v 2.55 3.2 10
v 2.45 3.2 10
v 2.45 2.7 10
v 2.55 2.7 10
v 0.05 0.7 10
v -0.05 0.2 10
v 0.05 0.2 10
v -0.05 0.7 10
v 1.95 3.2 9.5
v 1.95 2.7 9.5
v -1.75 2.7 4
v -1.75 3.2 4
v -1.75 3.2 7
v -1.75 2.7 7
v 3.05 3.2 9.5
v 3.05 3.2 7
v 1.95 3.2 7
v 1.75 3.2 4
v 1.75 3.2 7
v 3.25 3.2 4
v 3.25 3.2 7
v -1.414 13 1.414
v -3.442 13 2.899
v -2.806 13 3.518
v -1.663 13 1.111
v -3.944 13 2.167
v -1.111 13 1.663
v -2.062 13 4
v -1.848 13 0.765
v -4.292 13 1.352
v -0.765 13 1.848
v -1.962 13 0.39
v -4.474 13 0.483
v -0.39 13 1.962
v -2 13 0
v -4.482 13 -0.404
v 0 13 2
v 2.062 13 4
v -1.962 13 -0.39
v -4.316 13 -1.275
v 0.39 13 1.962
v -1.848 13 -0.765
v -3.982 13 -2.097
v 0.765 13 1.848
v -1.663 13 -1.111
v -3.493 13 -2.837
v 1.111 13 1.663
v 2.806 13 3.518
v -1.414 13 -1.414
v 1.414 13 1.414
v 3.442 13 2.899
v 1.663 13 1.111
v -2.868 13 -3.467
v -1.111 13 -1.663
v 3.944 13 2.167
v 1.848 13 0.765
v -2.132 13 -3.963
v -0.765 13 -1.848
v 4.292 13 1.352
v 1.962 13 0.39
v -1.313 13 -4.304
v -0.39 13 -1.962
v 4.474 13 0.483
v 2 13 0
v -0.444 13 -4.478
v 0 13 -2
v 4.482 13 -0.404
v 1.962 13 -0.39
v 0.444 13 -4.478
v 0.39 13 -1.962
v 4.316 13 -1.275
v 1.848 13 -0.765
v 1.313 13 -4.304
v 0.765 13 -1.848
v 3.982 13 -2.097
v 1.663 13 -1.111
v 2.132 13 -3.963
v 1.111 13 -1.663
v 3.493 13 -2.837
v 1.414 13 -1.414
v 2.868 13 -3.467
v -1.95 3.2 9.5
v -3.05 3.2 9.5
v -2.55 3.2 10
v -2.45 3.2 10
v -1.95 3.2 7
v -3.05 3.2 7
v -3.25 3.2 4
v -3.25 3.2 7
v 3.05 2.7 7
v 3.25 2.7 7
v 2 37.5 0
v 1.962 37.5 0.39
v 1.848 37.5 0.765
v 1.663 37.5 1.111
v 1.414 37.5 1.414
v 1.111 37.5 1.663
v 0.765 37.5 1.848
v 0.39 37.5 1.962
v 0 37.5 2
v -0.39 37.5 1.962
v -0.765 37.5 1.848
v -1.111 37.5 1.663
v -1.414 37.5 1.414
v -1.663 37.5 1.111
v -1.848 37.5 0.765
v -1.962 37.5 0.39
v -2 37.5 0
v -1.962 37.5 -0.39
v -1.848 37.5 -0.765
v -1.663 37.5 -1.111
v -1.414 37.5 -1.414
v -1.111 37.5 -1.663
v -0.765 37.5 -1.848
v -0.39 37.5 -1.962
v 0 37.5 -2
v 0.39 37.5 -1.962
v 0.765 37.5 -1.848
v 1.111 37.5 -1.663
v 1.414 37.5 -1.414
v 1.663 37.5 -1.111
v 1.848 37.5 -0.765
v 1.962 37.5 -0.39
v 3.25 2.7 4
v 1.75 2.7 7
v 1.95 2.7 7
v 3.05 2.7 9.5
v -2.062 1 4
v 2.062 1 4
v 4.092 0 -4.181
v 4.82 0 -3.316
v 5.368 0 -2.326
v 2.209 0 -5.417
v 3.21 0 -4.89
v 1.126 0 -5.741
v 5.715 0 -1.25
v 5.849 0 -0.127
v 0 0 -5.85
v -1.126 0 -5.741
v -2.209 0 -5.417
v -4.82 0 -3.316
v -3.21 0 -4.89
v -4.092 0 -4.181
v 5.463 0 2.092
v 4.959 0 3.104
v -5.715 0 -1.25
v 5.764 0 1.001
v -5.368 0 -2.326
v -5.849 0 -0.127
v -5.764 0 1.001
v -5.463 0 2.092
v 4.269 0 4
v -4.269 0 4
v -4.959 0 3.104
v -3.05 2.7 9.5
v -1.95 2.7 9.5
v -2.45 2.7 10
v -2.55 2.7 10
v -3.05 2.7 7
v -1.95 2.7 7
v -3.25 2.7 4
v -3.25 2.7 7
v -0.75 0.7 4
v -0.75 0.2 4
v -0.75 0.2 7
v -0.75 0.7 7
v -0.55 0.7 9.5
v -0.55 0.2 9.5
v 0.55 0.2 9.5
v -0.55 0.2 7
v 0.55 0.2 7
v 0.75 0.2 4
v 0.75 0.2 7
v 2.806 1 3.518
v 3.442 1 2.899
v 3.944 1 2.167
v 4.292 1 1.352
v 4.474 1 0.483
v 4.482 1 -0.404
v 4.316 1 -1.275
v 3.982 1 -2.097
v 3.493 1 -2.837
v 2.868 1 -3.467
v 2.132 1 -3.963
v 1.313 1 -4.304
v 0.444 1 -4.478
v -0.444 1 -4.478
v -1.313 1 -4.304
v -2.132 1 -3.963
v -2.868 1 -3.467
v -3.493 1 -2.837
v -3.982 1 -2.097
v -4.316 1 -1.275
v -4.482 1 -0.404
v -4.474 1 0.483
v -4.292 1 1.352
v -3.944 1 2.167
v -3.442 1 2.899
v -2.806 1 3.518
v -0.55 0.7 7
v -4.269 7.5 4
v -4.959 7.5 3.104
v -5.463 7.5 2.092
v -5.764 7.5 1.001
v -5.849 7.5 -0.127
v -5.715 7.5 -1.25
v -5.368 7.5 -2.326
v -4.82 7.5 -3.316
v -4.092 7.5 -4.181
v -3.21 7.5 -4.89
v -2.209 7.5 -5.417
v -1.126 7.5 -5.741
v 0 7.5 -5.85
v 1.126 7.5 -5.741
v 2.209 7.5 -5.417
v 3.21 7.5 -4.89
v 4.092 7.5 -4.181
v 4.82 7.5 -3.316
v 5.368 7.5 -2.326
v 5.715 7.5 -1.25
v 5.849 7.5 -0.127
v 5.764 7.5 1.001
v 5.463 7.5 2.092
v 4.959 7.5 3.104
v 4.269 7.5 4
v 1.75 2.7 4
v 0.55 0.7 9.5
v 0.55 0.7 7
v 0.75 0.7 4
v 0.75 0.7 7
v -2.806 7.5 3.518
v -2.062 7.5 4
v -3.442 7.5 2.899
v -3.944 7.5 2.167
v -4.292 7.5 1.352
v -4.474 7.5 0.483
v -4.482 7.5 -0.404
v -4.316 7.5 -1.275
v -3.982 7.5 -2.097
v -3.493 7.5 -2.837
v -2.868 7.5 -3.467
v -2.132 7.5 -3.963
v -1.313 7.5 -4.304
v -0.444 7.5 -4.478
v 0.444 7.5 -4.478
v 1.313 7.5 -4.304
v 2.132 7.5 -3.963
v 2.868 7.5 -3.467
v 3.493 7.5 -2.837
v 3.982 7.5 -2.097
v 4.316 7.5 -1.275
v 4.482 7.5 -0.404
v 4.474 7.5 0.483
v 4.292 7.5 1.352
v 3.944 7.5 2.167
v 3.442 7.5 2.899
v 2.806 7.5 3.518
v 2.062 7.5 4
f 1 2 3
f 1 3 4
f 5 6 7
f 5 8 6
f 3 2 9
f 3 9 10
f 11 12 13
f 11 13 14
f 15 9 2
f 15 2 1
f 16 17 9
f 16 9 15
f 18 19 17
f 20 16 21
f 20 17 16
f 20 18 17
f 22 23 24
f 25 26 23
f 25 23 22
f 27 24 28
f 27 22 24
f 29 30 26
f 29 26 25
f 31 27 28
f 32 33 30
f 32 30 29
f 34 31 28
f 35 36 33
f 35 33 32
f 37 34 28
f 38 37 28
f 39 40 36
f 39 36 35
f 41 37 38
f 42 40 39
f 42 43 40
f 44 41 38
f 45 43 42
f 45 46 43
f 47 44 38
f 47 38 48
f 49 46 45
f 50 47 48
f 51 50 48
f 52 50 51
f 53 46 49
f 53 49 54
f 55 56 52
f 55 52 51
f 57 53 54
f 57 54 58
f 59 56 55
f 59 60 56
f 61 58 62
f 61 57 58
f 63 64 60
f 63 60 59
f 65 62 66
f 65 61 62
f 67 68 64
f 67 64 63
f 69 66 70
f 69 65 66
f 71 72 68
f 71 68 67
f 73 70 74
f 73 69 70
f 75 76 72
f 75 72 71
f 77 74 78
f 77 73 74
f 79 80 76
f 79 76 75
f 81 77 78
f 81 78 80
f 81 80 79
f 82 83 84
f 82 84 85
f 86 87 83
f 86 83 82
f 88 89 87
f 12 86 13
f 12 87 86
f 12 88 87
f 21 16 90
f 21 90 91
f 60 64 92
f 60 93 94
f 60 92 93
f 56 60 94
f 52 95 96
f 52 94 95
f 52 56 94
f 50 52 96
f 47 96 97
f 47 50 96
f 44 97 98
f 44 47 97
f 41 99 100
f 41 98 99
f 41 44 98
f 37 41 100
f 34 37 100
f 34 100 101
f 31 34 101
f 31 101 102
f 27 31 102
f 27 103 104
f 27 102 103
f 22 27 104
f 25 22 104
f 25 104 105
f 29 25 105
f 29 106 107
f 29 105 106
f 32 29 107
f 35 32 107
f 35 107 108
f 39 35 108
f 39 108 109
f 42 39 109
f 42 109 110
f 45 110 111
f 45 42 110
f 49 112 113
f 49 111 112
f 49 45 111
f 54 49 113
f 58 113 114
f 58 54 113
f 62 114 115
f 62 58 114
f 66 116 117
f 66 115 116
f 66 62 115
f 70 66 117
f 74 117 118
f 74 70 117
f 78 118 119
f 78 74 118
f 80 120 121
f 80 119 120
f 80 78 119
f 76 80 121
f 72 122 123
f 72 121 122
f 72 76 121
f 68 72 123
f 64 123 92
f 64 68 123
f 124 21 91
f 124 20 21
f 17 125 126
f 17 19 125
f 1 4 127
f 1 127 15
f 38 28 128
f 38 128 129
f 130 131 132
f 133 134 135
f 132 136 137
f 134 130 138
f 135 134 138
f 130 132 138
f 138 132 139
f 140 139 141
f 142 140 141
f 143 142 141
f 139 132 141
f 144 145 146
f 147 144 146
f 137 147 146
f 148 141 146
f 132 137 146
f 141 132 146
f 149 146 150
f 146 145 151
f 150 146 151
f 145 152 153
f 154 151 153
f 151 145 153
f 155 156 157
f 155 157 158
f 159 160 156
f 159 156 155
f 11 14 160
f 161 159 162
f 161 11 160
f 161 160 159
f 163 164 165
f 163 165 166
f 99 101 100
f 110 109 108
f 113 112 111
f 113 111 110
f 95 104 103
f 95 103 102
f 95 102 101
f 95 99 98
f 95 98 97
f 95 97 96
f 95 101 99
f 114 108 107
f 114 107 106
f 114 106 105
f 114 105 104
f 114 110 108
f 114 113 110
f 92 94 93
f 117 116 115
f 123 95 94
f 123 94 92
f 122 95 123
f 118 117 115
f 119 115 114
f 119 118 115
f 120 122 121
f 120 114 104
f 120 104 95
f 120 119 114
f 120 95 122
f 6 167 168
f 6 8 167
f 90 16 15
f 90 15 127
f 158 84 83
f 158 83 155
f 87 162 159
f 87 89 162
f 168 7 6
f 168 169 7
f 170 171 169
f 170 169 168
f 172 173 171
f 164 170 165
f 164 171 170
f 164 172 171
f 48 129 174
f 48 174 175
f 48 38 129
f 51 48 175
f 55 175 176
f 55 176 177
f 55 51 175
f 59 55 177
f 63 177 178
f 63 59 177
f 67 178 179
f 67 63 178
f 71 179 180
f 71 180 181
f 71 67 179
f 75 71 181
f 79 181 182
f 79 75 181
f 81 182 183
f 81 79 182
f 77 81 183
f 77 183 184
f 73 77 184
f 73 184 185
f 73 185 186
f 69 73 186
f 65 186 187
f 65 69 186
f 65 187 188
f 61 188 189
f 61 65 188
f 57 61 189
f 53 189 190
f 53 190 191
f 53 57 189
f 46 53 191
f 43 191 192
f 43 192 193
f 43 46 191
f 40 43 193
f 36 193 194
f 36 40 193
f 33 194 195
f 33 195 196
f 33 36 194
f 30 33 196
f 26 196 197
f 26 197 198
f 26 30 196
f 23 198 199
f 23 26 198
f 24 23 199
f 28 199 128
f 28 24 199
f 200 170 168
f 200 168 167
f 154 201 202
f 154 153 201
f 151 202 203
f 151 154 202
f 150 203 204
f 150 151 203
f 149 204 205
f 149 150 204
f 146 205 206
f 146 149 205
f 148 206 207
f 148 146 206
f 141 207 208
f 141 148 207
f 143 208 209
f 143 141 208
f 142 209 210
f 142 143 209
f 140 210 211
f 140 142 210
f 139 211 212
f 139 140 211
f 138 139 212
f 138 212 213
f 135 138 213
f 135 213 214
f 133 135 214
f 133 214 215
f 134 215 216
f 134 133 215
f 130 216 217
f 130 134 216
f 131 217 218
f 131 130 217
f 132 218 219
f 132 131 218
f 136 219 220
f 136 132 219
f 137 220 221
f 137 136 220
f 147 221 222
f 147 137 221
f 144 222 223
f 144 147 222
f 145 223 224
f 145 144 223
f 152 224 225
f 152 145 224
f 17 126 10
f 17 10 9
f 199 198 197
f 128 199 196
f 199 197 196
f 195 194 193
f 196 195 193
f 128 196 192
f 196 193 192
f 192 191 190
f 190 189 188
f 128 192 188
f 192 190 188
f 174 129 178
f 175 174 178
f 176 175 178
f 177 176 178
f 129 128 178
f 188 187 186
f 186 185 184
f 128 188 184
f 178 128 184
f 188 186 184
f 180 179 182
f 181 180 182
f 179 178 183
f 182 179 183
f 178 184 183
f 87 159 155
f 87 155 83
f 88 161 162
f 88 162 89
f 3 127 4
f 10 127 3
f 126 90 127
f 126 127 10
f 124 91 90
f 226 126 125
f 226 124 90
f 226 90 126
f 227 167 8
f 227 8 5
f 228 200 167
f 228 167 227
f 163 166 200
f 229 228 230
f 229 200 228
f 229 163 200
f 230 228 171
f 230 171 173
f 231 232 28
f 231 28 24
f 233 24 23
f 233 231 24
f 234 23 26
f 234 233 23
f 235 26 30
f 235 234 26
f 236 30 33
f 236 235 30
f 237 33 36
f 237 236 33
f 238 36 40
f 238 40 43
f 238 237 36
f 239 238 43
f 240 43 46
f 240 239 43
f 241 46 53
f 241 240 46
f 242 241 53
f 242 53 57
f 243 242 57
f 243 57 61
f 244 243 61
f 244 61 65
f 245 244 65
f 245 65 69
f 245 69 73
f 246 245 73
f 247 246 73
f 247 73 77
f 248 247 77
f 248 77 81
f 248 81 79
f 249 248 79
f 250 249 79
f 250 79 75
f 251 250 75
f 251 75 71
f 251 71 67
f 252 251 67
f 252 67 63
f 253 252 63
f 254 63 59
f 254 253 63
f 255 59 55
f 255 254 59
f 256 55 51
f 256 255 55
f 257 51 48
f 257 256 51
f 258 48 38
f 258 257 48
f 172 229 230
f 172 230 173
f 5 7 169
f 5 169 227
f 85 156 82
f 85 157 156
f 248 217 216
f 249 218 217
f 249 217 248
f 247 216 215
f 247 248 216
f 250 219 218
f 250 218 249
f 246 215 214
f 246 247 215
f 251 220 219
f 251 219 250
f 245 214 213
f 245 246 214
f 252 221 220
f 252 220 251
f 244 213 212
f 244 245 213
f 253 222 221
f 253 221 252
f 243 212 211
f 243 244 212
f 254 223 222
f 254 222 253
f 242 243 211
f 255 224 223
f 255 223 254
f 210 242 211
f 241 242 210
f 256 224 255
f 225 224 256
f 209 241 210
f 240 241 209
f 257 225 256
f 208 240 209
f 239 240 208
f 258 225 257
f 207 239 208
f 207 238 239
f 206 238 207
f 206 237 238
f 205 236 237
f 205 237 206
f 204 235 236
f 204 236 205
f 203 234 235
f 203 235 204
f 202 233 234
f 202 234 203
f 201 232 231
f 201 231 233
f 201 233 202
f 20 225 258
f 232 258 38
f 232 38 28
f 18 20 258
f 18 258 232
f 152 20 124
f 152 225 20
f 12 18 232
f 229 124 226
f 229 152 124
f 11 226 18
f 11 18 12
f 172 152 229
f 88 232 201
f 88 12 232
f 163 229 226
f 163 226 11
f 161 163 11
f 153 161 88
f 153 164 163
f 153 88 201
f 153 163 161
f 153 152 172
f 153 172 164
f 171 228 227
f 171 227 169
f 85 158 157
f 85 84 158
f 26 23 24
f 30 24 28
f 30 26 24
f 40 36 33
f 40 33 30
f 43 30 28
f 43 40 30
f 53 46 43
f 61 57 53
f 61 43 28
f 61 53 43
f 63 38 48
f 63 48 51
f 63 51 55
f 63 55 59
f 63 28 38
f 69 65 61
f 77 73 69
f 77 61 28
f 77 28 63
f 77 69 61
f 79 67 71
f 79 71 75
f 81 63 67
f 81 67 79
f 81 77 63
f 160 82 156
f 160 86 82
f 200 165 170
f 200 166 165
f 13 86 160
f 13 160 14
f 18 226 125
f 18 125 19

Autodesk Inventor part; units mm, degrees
ref_plane "YZ Plane" through (0, 0, 0) normal (1, 0, 0) x (0, 1, 0)
ref_plane "XZ Plane" through (0, 0, 0) normal (0, 1, 0) x (-1, 0, 0)
ref_plane "XY Plane" through (0, 0, 0) normal (0, 0, 1) x (1, 0, 0)
sketch "Sketch1" plane through (0, 0, 0) normal (0, 1, 0) x (-1, 0, 0)
  circle A0 centre (0, 0) radius 5.85
  line L0 (5, 0) -> (-5, 0)
  line L1 (-5, 0) -> (-5, 4)
  line L2 (-5, 4) -> (5, 4)
  line L3 (5, 4) -> (5, 0)
  point P0 (4.2688, 4)
  point P1 (-4.2688, 4)
  dimension "d0" = 11.7
  dimension "d1" = 4
  dimension "d2" = 10
extrude "Extrusion1" add sketch "Sketch1" along normal blind 7.5 contours A0 L1 L0 L3 | L3 L0 L1 A0 L2
sketch "Sketch2" plane through (0, 7.5, 0) normal (0, 1, 0) x (1, 0, 0)
  arc A0 (4.2688, -4) -> (-4.2688, -4) centre (0, 0) ccw projected
  circle A1 centre (0, 0) radius 4.5
  line L0 (-4.2688, -4) -> (4.2688, -4) projected
  arc A2 (4.2688, -4) -> (-4.2688, -4) centre (0, 0) ccw projected
  point P0 (-2.0616, -4)
  point P1 (2.0616, -4)
  dimension "d5" = 9
extrude "Extrusion2" add sketch "Sketch2" along normal blind 5.5 contours L0 A1 picked at (-0.2884, 2.0732)
sketch "Sketch3" plane through (0, 13, 0) normal (0, 1, 0) x (1, 0, 0)
  circle A0 centre (0, 0) radius 2
  dimension "d8" = 4
extrude "Extrusion3" add sketch "Sketch3" along normal blind 24.5
sketch "Sketch4" plane through (-4.2688, 0, 4) normal (0, 0, 1) x (1, 0, 0)
  line L0 (3.5188, 0.7) -> (5.0188, 0.7)
  line L1 (5.0188, 0.7) -> (5.0188, 0.2)
  line L2 (5.0188, 0.2) -> (3.5188, 0.2)
  line L3 (3.5188, 0.2) -> (3.5188, 0.7)
  line L4 (0, 0) -> (8.5376, 0) projected
  line L5 (6.3303, 7.5) -> (8.5376, 7.5) projected
  line L6 (1.0188, 3.2) -> (2.5188, 3.2)
  line L7 (2.5188, 3.2) -> (2.5188, 2.7)
  line L8 (2.5188, 2.7) -> (1.0188, 2.7)
  line L9 (1.0188, 2.7) -> (1.0188, 3.2)
  line L10 (6.0188, 3.2) -> (7.5188, 3.2)
  line L11 (7.5188, 3.2) -> (7.5188, 2.7)
  line L12 (7.5188, 2.7) -> (6.0188, 2.7)
  line L13 (6.0188, 2.7) -> (6.0188, 3.2)
  point P0 (4.2688, 0)
  point P1 (4.2688, 0)
  point P2 (4.2688, 0.2)
  point P3 (5.0188, 0.45)
  point P4 (2.5188, 2.95)
  point P5 (6.0188, 2.95)
  point P6 (3.5188, 0.45)
  point P7 (1.0188, 2.95)
  point P8 (6.7688, 2.7)
  point P9 (1.7688, 2.7)
  dimension "d11" = 0.5
  dimension "d12" = 1.5
  dimension "d13" = 7.05
  dimension "d14" = 2.5
  dimension "d15" = 2.5
  dimension "d16" = 2.5
extrude "Extrusion4" add sketch "Sketch4" along normal blind 3
sketch "Sketch5" plane through (-4.2688, 0, 7) normal (0, 0, 1) x (1, 0, 0)
  line L0 (1.0188, 3.2) -> (2.5188, 3.2) projected
  line L1 (1.2188, 3.2) -> (2.3188, 3.2)
  line L2 (2.3188, 3.2) -> (2.3188, 2.7)
  line L3 (2.3188, 2.7) -> (1.2188, 2.7)
  line L4 (1.2188, 2.7) -> (1.2188, 3.2)
  line L5 (1.0188, 2.7) -> (2.5188, 2.7) projected
  line L6 (7.5188, 3.2) -> (6.0188, 3.2) projected
  line L7 (6.2188, 3.2) -> (7.3188, 3.2)
  line L8 (7.3188, 3.2) -> (7.3188, 2.7)
  line L9 (7.3188, 2.7) -> (6.2188, 2.7)
  line L10 (6.2188, 2.7) -> (6.2188, 3.2)
  line L11 (3.5188, 0.7) -> (5.0188, 0.7) projected
  line L12 (3.7188, 0.7) -> (4.8188, 0.7)
  line L13 (4.8188, 0.7) -> (4.8188, 0.2)
  line L14 (4.8188, 0.2) -> (3.7188, 0.2)
  line L15 (3.7188, 0.2) -> (3.7188, 0.7)
  line L16 (6.0188, 2.7) -> (7.5188, 2.7) projected
  line L17 (3.5188, 0.2) -> (5.0188, 0.2) projected
  point P0 (4.2688, 0)
  point P1 (1.7688, 2.7)
  point P2 (2.3188, 2.95)
  point P3 (6.7688, 2.7)
  point P4 (4.2688, 0.2)
  point P5 (7.3188, 2.95)
  point P6 (6.2188, 2.95)
  dimension "d19" = 1.1
  dimension "d20" = 1.1
  dimension "d21" = 1.1
extrude "Extrusion5" add sketch "Sketch5" along normal blind 3
chamfer "Chamfer1" distance 0.5 angle 45 6 edges at (-3.05, 2.95, 10) (-1.95, 2.95, 10) (-0.55, 0.45, 10) (0.55, 0.45, 10) (1.95, 2.95, 10) (3.05, 2.95, 10)
sketch "Sketch6" plane through (0, 13, 0) normal (0, 1, 0) x (1, 0, 0)
  circle A0 centre (0, 0) radius 2 projected
  arc A1 (2.0616, -4) -> (-2.0616, -4) centre (0, 0) ccw projected
  line L0 (-2.0616, -4) -> (2.0616, -4) projected
extrude "Extrusion6" add sketch "Sketch6" against normal blind 12 separate body contours A0 | L0 A1
properties part number "SMC10H04"
